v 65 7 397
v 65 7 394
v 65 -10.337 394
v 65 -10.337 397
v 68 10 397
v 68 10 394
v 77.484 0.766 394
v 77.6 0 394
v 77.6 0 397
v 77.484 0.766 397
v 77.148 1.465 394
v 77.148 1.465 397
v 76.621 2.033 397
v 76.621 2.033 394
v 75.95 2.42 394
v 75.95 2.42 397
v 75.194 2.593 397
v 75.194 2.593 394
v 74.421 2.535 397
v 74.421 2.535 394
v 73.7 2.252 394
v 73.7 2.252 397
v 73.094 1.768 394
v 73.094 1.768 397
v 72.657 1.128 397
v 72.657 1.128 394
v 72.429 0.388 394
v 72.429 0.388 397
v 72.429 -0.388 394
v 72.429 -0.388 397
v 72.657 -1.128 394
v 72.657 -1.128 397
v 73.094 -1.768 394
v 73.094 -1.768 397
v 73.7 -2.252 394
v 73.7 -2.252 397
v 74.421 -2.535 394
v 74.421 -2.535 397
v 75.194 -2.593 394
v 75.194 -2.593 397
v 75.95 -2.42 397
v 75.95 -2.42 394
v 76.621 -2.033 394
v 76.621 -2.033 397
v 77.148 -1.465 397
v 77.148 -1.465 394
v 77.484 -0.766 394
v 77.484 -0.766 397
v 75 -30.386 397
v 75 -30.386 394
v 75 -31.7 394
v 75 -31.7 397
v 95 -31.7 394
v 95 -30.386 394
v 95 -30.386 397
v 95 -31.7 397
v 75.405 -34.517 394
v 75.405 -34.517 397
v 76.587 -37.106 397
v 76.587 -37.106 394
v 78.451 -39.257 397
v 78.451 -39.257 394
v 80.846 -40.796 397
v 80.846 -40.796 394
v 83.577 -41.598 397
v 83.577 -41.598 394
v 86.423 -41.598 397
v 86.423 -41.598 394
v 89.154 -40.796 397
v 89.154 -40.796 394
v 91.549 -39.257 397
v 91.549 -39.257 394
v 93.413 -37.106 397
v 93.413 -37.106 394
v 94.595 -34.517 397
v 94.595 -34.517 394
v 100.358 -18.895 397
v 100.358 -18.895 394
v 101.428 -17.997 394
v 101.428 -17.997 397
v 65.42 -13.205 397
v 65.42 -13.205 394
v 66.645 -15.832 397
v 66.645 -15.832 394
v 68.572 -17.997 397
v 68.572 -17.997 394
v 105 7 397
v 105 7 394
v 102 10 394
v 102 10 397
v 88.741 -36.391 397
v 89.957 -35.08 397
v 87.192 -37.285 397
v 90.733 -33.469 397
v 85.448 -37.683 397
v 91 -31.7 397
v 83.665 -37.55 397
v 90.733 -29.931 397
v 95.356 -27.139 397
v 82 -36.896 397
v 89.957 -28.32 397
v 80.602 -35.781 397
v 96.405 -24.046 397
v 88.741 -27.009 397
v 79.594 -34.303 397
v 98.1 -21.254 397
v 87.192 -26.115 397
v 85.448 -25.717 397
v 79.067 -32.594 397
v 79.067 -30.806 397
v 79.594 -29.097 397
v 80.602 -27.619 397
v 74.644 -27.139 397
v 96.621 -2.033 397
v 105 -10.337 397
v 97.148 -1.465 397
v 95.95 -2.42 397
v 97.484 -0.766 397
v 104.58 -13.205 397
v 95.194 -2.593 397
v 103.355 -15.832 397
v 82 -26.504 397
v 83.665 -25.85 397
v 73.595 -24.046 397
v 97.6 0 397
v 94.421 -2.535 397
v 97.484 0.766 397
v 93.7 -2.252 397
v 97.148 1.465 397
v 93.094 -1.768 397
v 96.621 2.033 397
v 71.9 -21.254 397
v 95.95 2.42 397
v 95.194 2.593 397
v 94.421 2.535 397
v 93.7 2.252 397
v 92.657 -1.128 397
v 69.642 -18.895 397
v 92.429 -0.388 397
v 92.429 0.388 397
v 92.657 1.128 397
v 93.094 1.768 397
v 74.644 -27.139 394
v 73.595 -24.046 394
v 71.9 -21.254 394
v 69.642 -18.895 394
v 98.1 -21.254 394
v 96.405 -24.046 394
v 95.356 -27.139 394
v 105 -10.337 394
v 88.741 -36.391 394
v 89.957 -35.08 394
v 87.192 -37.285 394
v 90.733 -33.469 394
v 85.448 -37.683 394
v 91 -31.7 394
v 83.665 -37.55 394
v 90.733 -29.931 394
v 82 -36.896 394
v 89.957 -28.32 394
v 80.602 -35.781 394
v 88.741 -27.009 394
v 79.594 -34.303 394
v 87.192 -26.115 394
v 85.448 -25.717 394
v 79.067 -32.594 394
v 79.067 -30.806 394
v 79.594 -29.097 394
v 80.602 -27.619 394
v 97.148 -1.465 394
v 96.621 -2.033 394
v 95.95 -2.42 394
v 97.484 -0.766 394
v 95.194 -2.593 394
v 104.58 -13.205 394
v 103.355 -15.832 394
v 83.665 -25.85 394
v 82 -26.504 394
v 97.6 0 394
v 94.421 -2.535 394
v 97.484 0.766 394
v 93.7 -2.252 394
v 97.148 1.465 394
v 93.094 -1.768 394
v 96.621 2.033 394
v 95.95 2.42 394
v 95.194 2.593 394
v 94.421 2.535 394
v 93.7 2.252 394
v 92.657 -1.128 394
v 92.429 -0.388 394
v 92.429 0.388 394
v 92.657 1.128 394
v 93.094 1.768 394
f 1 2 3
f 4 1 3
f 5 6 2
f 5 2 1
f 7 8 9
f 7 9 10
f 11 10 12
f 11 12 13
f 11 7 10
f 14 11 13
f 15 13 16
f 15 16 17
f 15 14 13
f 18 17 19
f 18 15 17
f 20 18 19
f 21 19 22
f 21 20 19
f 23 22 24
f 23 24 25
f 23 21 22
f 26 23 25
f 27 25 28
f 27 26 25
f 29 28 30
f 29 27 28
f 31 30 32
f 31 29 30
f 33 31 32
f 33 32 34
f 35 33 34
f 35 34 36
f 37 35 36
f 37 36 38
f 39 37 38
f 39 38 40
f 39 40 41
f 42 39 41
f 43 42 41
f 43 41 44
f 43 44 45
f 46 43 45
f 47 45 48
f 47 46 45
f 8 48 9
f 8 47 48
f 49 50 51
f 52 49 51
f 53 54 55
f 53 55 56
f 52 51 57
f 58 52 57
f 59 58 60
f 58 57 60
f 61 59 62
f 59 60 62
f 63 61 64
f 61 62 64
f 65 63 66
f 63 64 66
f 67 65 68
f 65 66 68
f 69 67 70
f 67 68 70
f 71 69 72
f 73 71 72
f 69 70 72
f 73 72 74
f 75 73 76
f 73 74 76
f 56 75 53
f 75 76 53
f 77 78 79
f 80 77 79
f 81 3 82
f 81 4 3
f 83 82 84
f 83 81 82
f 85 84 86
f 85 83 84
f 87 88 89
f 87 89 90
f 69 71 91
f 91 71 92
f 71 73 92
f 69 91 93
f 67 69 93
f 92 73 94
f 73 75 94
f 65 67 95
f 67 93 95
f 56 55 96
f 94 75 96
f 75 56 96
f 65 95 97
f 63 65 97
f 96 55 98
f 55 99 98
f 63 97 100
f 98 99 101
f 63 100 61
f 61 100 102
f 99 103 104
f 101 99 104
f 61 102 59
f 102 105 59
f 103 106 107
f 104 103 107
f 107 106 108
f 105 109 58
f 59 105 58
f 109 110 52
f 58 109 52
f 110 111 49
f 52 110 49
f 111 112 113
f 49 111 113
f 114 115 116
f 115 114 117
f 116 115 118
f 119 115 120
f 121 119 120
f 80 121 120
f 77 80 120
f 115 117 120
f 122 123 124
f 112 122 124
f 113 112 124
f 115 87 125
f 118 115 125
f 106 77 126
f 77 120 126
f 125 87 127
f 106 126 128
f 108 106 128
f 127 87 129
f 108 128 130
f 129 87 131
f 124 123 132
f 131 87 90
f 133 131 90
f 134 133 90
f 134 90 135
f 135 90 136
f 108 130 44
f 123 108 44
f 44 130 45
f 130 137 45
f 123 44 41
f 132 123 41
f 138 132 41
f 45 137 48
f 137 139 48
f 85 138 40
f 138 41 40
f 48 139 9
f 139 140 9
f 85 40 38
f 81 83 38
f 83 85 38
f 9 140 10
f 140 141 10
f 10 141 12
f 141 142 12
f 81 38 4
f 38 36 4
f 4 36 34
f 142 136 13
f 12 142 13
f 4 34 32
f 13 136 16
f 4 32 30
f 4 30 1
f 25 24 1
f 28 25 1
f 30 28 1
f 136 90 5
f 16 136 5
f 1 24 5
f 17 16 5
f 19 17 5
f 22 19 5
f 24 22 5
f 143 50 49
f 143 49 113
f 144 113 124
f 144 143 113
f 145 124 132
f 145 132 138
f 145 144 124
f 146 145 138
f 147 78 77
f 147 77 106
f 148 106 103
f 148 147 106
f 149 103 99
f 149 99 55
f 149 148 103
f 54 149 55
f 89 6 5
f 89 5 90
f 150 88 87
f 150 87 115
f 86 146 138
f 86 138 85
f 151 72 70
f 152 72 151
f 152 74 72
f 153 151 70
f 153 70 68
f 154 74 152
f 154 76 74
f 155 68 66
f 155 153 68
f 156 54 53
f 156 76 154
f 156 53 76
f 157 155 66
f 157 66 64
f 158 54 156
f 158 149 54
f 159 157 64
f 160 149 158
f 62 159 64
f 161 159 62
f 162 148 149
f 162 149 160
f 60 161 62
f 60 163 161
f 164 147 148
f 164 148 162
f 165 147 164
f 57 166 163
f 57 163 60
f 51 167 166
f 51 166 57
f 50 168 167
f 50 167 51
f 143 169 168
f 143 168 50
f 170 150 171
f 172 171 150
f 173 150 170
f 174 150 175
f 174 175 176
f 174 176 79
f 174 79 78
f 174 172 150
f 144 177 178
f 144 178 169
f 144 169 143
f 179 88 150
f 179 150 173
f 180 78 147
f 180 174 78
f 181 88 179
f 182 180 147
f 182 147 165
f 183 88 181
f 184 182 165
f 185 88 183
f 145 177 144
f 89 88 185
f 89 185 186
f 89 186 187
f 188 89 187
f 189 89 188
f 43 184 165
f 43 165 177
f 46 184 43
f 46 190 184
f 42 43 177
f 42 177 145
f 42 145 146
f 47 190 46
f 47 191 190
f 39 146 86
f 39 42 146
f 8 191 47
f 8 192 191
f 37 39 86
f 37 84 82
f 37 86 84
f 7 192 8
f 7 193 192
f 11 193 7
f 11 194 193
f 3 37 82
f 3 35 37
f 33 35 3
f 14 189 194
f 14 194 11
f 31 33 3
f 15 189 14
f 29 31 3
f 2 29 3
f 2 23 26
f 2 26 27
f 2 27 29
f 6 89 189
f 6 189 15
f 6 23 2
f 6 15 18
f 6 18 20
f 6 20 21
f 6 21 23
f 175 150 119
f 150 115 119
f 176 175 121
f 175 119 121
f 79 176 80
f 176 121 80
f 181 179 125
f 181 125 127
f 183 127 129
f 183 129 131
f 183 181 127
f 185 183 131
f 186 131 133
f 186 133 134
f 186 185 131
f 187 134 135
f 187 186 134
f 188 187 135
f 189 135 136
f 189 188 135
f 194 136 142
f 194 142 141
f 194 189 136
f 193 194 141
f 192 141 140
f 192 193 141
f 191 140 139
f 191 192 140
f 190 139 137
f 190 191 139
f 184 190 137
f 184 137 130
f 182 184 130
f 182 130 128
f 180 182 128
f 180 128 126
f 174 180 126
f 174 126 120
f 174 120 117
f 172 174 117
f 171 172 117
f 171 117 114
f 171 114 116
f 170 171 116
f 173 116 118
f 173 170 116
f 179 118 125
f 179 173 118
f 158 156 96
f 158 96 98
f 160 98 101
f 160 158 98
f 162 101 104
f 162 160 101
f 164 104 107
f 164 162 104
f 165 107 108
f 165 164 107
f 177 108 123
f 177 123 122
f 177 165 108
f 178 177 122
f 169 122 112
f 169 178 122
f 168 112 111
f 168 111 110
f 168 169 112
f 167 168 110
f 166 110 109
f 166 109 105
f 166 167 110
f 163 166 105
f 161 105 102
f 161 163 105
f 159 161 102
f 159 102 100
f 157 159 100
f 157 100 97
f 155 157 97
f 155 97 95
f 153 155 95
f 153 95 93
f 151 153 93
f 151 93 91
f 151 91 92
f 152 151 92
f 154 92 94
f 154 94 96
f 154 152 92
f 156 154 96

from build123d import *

# Parameters (mm, degrees)
SKETCH058_R     = 6
SKETCH058_R_2   = 2.6
PAD019_DEPTH    = 3
FILLET011_R     = 10
CHAMFER018_SIZE = 3


with BuildPart() as part:
    # Sketch058 → Pad019 (new body)
    with BuildSketch(Plane.XY):
        with BuildLine():
            Line((-20, -10), (-20, 10))
            Line((-20, 10), (20, 10))
            Line((20, 10), (20, -10))
            Line((20, -10), (20, -15))
            Line((15.358186, -18.894945), (20, -15))
            ThreePointArc((15.358186, -18.894945), (11.405383, -24.046337), (10, -30.385611))
            Line((10, -30.385611), (10, -31.7))
            ThreePointArc((-10, -31.7), (0, -41.7), (10, -31.7))
            Line((-10, -30.385611), (-10, -31.7))
            ThreePointArc((-10, -30.385611), (-11.405383, -24.046337), (-15.358186, -18.894945))
            Line((-15.358186, -18.894945), (-20, -15))
            Line((-20, -10), (-20, -15))
        make_face()
        with Locations((0, -31.7)):
            Circle(SKETCH058_R, mode=Mode.SUBTRACT)
        with Locations((-10, 0)):
            Circle(SKETCH058_R_2, mode=Mode.SUBTRACT)
        with Locations((10, 0)):
            Circle(SKETCH058_R_2, mode=Mode.SUBTRACT)
    extrude(amount=PAD019_DEPTH)

    # Fillet011
    fillet011_edges = [part.edges().sort_by_distance(p)[0] for p in [
        (-20, -15, 1.5),
        (20, -15, 1.5),
    ]]
    fillet(fillet011_edges, radius=FILLET011_R)

    # Chamfer018
    chamfer018_edges = [part.edges().sort_by_distance(p)[0] for p in [
        (-20, 10, 1.5),
        (20, 10, 1.5),
    ]]
    chamfer(chamfer018_edges, length=CHAMFER018_SIZE)


with BuildPart() as part_1:
    # Body011 placement: moved
    add(part.part.moved(Location((85, 0, 394))))


solid = part_1.part
